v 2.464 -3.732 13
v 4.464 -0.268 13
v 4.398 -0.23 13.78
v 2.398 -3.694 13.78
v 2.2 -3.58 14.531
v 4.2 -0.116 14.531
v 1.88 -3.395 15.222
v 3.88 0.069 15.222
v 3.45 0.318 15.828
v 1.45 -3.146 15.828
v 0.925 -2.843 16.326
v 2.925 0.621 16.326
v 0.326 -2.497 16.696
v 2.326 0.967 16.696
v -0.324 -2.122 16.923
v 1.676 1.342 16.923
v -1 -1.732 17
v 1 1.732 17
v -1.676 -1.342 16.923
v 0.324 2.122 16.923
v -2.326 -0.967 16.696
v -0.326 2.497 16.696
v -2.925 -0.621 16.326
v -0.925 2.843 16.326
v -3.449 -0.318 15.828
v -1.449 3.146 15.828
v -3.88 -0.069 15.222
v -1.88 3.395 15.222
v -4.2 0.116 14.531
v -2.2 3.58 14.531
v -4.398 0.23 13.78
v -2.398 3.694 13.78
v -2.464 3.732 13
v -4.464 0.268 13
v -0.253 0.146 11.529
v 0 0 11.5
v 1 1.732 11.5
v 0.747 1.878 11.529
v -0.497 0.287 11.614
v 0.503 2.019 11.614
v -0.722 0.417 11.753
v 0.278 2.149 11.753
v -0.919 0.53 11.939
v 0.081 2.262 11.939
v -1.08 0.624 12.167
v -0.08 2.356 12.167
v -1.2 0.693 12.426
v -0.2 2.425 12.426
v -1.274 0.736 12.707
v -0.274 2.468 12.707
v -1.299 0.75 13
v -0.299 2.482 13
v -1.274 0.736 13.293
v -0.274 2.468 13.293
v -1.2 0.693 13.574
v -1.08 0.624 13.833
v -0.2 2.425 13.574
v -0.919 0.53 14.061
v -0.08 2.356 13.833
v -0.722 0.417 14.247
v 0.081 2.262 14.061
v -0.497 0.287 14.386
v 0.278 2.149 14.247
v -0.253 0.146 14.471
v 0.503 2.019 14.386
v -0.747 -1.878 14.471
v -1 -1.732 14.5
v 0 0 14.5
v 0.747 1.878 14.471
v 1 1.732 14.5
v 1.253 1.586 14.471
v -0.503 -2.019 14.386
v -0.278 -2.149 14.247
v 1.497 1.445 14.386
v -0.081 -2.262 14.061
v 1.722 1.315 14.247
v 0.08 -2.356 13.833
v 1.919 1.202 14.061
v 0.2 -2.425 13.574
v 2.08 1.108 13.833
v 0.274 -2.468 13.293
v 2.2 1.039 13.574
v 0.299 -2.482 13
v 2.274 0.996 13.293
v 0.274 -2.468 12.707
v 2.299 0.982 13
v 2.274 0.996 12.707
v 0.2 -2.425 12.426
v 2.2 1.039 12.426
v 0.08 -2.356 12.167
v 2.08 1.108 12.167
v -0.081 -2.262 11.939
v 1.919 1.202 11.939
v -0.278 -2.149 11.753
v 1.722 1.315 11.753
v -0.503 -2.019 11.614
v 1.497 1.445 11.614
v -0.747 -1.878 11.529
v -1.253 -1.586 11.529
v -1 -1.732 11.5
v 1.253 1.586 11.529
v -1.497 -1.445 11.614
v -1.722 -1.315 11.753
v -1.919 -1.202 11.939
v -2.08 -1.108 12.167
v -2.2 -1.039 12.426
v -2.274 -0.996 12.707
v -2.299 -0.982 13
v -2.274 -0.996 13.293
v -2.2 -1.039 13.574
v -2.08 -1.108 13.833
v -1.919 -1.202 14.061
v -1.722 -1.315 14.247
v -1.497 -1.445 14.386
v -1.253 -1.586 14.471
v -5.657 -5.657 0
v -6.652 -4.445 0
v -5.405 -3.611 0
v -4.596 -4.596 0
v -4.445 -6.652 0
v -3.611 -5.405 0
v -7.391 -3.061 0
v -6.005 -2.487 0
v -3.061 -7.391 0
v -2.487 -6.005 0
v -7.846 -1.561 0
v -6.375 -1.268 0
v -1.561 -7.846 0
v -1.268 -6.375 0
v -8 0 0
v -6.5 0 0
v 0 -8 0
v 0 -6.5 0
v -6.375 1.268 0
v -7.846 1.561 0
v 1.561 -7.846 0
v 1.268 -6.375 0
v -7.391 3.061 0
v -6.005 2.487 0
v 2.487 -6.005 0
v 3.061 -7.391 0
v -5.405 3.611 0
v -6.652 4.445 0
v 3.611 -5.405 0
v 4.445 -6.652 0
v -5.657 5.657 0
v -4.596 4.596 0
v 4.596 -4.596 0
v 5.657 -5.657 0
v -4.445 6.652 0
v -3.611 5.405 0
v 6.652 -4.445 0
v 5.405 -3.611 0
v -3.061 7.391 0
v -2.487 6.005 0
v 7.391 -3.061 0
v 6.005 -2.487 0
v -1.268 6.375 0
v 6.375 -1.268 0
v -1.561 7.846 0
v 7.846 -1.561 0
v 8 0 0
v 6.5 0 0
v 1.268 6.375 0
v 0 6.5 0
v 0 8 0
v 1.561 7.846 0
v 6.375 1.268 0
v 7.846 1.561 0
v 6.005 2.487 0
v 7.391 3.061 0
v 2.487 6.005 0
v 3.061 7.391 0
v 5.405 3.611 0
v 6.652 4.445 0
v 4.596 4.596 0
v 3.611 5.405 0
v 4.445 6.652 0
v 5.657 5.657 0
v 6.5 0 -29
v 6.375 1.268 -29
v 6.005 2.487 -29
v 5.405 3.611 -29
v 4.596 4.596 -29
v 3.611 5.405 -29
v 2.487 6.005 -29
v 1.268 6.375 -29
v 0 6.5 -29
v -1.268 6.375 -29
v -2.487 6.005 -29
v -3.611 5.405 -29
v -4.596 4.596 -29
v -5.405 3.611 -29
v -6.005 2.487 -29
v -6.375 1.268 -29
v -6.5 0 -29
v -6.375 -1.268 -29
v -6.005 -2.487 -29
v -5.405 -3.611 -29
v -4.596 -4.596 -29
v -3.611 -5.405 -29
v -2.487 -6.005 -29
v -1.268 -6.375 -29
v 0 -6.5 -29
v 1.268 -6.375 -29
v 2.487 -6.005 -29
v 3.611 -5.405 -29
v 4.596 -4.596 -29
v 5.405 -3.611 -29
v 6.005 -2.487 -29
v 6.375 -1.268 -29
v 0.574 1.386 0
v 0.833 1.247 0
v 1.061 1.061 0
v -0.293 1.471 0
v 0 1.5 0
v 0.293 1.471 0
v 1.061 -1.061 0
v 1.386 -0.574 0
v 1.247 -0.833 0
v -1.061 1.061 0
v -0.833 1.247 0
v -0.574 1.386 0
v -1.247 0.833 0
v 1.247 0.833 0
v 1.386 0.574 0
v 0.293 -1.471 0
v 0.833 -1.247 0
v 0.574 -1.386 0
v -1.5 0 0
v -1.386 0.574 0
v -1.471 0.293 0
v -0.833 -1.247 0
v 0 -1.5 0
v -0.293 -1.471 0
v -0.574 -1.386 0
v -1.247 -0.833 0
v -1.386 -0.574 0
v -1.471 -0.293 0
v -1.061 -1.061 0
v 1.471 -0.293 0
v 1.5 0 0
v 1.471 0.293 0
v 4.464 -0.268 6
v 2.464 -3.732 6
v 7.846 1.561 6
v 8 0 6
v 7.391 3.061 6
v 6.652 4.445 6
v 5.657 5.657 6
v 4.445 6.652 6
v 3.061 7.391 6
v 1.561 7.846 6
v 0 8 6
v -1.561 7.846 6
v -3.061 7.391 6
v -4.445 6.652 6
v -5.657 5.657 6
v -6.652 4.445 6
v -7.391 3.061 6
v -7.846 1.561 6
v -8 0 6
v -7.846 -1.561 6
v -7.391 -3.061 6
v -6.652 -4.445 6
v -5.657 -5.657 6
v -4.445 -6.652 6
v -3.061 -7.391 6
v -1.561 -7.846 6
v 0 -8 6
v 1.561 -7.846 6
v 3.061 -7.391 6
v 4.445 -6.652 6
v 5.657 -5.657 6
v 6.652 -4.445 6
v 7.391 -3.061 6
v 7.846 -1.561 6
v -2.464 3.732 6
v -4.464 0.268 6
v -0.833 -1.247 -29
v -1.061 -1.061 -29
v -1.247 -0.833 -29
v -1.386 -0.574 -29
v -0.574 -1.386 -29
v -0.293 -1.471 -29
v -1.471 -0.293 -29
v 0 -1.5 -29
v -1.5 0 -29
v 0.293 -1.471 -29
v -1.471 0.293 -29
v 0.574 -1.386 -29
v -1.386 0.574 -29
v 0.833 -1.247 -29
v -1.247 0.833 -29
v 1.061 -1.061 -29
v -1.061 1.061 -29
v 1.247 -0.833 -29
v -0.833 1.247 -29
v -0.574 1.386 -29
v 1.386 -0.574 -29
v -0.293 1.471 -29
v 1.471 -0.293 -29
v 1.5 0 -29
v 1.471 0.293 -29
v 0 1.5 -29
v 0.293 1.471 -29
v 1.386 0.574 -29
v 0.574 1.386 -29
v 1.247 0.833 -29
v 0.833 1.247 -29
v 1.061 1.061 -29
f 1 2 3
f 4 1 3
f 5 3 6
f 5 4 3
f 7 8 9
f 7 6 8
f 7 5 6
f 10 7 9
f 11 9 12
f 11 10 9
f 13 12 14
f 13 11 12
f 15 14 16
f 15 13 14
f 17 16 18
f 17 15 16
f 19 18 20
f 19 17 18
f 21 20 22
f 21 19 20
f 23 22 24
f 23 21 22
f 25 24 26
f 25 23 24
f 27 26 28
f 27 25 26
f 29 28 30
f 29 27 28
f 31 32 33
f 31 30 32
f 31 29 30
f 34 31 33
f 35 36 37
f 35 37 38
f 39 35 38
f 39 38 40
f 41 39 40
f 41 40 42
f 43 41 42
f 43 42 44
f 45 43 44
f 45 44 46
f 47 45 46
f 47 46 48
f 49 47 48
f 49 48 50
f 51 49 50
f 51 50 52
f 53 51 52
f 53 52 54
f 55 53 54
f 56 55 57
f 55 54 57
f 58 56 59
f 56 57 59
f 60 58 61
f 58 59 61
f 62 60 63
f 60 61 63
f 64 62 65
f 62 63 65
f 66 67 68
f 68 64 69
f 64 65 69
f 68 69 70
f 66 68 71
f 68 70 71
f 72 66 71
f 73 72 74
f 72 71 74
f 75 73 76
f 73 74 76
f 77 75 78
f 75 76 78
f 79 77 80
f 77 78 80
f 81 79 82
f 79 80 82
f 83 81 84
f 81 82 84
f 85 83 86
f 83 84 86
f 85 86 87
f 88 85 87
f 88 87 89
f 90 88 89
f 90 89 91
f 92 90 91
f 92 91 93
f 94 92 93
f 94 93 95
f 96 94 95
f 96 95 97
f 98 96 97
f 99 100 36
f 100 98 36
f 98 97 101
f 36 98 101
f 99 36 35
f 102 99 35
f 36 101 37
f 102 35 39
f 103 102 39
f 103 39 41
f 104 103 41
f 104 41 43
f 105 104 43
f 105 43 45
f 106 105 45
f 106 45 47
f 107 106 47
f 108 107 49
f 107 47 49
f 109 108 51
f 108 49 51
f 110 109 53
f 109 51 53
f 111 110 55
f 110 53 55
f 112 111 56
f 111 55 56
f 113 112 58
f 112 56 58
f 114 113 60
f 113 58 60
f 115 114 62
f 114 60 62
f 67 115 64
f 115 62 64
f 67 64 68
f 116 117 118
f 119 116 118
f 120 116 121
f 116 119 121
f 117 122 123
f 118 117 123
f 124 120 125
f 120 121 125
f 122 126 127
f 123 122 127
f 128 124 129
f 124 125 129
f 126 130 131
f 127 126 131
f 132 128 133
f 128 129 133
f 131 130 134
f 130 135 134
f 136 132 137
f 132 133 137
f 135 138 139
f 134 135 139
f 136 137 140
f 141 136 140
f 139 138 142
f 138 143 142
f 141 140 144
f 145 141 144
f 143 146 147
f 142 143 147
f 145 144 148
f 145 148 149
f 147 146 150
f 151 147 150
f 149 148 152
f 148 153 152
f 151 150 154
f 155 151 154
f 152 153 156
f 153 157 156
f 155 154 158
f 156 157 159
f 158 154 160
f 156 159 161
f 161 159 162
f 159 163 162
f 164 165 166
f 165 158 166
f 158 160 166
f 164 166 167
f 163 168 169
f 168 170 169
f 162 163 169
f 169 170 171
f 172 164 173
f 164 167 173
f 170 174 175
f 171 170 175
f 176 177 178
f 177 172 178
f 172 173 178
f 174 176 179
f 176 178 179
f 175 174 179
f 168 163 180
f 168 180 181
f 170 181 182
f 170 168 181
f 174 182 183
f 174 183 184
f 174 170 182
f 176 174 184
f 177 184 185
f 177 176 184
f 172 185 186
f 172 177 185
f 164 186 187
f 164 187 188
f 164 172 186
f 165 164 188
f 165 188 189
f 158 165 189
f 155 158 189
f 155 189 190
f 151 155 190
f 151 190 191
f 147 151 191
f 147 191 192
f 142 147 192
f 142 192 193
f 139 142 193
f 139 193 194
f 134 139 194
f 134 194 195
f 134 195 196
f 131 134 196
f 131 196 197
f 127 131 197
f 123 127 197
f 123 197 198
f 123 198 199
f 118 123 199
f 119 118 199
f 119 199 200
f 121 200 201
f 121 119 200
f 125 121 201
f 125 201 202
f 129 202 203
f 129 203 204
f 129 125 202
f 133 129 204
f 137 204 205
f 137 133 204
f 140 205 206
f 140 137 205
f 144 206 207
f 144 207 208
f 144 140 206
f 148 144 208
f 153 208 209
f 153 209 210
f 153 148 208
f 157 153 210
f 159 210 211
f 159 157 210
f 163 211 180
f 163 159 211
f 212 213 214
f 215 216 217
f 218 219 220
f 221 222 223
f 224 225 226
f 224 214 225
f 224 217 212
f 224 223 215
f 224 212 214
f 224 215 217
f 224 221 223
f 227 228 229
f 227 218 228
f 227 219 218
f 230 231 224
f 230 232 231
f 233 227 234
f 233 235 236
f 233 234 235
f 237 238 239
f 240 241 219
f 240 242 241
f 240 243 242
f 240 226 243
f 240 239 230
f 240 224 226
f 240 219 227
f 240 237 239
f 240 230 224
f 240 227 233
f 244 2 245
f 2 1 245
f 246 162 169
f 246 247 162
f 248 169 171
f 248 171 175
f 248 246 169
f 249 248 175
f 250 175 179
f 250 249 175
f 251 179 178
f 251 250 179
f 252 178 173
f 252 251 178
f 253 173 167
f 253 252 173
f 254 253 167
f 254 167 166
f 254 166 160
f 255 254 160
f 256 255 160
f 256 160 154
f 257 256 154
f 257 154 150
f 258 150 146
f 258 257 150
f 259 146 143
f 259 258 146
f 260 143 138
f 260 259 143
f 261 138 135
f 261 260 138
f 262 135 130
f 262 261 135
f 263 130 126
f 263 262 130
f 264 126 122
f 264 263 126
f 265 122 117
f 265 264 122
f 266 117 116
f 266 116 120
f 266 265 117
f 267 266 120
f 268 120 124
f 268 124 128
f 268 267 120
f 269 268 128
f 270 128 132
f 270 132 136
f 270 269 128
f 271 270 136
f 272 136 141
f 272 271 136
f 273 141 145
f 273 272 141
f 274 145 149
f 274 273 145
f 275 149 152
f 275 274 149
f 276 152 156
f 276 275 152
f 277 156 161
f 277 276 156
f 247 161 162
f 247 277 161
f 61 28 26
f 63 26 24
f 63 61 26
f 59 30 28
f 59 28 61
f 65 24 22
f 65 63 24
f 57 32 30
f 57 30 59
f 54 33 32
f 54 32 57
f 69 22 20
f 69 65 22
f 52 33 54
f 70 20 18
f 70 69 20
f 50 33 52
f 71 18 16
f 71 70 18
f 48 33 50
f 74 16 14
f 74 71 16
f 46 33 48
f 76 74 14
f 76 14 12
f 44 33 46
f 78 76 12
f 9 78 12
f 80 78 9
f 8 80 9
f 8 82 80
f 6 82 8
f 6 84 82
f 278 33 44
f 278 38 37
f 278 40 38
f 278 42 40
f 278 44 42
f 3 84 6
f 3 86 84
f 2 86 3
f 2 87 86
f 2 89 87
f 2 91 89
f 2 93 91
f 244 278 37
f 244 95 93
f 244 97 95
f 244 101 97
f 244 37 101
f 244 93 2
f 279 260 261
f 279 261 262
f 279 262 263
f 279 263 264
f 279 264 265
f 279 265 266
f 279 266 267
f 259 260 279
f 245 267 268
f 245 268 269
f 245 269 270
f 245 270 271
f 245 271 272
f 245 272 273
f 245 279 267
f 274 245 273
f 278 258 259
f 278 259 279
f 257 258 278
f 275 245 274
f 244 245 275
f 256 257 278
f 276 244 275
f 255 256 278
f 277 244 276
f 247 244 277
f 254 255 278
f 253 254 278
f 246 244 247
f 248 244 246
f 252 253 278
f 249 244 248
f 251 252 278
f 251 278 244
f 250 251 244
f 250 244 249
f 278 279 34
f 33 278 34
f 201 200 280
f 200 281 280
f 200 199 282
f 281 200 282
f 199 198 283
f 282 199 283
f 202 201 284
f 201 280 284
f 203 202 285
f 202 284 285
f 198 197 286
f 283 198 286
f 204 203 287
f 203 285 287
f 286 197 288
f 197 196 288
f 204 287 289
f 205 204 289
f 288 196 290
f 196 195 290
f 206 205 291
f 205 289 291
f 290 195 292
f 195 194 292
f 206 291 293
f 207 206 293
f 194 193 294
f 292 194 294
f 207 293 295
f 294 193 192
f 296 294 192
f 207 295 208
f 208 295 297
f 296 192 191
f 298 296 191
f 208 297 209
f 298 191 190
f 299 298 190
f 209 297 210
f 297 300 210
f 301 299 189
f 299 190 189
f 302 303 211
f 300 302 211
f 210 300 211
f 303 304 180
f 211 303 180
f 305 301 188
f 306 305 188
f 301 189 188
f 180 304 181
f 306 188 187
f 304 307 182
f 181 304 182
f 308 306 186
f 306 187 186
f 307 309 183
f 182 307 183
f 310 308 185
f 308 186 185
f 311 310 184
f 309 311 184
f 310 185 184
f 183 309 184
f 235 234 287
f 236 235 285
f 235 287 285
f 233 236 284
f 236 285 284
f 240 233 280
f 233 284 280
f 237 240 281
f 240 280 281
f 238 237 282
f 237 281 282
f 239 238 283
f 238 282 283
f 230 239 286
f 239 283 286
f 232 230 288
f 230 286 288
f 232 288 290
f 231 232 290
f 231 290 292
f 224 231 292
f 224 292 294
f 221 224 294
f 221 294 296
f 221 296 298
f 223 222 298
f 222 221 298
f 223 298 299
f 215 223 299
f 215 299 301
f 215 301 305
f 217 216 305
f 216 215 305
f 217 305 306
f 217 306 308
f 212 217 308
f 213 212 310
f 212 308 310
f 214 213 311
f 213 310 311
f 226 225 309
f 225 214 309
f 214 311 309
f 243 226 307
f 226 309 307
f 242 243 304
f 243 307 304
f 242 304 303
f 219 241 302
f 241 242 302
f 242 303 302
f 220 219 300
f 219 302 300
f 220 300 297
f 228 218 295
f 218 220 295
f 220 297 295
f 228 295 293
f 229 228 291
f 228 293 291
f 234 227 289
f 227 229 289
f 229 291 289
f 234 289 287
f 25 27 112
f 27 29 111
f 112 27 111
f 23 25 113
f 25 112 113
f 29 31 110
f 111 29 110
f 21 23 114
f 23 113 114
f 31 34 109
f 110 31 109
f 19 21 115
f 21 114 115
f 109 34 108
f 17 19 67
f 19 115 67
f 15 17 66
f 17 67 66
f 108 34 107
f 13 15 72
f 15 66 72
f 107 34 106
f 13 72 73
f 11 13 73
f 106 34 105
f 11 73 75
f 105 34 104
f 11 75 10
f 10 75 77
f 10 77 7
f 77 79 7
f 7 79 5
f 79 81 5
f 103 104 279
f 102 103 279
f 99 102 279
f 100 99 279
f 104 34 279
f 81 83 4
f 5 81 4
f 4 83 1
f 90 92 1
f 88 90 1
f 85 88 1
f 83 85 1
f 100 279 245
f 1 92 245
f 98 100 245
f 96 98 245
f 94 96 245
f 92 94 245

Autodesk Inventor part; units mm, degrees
ref_plane "YZ Plane" through (0, 0, 0) normal (1, 0, 0) x (0, 1, 0)
ref_plane "XZ Plane" through (0, 0, 0) normal (0, 1, 0) x (-1, 0, 0)
ref_plane "XY Plane" through (0, 0, 0) normal (0, 0, 1) x (1, 0, 0)
sketch "スケッチ1" plane through (0, 0, 0) normal (0, 0, 1) x (1, 0, 0)
  line L0 (0, 7.5056) -> (6.5, 3.7528)
  line L1 (6.5, 3.7528) -> (6.5, -3.7528)
  line L2 (6.5, -3.7528) -> (0, -7.5056)
  line L3 (0, -7.5056) -> (-6.5, -3.7528)
  line L4 (-6.5, -3.7528) -> (-6.5, 3.7528)
  line L5 (-6.5, 3.7528) -> (0, 7.5056)
  circle A0 centre (0, 0) radius 6.5
  dimension "d0" = 13
  dimension "d1" = 13
extrude "押し出し1" add sketch "スケッチ1" along normal blind 6
extrude "押し出し2" add sketch "スケッチ1" against normal blind 29 contours A0
ref_plane "作業平面1" through (-3.25, 1.8764, 6) normal (0.5, 0.8660254, 0) x (0.8660254, -0.5, 0)
sketch "スケッチ2" plane through (-3.25, 1.8764, 6) normal (0.5, 0.8660254, 0) x (0.8660254, -0.5, 0)
  line L0 (0, 6) -> (3.7528, 6) projected
  line L1 (0, 6) -> (0, 0) projected
  line L2 (7.5056, 0) -> (0, 0) projected
  line L3 (7.5056, 6) -> (7.5056, 0) projected
  line L4 (3.7528, 6) -> (3.7528, -7)
  line L5 (3.7528, -7) -> (3.7528, 0) construction
  line L6 (7.7528, -7) -> (7.7528, 0)
  line L7 (-0.2472, 0) -> (-0.2472, -7)
  arc A0 (-0.2472, -7) -> (7.7528, -7) centre (3.7528, -7) ccw
  arc A1 (7.7528, 0) -> (-0.2472, 0) centre (3.7528, 0) ccw
  line L8 (3.7528, 6) -> (7.5056, 6) projected
  point P0 (3.7528, -3.5)
  dimension "d7" = 7
  dimension "d8" = 8
extrude "押し出し3" add sketch "スケッチ2" along normal mid plane 4 contours A1 L4 L2 L1 | L1 L2 L3 A1 L6 A0 L7 | A1 L3 L2 L4
hole "穴1" at (0, 0, 13) direction (0.5, 0.8660254, 0) diameter 3 end through all
hole "穴2" at (0, 0, 13) direction (-0.5, -0.8660254, 0) diameter 3 end through all
hole "穴3" at (0, 0, 0) direction (0, 0, -1) diameter 3 end through all
sketch "スケッチ3" plane through (0, 0, 6) normal (0, 0, 1) x (1, 0, 0)
  circle A0 centre (0, 0) radius 1.5 projected
  circle A1 centre (0, 0) radius 8
  dimension "d32" = 16
extrude "押し出し4" add sketch "スケッチ3" against normal blind 6
properties part number "ダンパー上パーツ"
